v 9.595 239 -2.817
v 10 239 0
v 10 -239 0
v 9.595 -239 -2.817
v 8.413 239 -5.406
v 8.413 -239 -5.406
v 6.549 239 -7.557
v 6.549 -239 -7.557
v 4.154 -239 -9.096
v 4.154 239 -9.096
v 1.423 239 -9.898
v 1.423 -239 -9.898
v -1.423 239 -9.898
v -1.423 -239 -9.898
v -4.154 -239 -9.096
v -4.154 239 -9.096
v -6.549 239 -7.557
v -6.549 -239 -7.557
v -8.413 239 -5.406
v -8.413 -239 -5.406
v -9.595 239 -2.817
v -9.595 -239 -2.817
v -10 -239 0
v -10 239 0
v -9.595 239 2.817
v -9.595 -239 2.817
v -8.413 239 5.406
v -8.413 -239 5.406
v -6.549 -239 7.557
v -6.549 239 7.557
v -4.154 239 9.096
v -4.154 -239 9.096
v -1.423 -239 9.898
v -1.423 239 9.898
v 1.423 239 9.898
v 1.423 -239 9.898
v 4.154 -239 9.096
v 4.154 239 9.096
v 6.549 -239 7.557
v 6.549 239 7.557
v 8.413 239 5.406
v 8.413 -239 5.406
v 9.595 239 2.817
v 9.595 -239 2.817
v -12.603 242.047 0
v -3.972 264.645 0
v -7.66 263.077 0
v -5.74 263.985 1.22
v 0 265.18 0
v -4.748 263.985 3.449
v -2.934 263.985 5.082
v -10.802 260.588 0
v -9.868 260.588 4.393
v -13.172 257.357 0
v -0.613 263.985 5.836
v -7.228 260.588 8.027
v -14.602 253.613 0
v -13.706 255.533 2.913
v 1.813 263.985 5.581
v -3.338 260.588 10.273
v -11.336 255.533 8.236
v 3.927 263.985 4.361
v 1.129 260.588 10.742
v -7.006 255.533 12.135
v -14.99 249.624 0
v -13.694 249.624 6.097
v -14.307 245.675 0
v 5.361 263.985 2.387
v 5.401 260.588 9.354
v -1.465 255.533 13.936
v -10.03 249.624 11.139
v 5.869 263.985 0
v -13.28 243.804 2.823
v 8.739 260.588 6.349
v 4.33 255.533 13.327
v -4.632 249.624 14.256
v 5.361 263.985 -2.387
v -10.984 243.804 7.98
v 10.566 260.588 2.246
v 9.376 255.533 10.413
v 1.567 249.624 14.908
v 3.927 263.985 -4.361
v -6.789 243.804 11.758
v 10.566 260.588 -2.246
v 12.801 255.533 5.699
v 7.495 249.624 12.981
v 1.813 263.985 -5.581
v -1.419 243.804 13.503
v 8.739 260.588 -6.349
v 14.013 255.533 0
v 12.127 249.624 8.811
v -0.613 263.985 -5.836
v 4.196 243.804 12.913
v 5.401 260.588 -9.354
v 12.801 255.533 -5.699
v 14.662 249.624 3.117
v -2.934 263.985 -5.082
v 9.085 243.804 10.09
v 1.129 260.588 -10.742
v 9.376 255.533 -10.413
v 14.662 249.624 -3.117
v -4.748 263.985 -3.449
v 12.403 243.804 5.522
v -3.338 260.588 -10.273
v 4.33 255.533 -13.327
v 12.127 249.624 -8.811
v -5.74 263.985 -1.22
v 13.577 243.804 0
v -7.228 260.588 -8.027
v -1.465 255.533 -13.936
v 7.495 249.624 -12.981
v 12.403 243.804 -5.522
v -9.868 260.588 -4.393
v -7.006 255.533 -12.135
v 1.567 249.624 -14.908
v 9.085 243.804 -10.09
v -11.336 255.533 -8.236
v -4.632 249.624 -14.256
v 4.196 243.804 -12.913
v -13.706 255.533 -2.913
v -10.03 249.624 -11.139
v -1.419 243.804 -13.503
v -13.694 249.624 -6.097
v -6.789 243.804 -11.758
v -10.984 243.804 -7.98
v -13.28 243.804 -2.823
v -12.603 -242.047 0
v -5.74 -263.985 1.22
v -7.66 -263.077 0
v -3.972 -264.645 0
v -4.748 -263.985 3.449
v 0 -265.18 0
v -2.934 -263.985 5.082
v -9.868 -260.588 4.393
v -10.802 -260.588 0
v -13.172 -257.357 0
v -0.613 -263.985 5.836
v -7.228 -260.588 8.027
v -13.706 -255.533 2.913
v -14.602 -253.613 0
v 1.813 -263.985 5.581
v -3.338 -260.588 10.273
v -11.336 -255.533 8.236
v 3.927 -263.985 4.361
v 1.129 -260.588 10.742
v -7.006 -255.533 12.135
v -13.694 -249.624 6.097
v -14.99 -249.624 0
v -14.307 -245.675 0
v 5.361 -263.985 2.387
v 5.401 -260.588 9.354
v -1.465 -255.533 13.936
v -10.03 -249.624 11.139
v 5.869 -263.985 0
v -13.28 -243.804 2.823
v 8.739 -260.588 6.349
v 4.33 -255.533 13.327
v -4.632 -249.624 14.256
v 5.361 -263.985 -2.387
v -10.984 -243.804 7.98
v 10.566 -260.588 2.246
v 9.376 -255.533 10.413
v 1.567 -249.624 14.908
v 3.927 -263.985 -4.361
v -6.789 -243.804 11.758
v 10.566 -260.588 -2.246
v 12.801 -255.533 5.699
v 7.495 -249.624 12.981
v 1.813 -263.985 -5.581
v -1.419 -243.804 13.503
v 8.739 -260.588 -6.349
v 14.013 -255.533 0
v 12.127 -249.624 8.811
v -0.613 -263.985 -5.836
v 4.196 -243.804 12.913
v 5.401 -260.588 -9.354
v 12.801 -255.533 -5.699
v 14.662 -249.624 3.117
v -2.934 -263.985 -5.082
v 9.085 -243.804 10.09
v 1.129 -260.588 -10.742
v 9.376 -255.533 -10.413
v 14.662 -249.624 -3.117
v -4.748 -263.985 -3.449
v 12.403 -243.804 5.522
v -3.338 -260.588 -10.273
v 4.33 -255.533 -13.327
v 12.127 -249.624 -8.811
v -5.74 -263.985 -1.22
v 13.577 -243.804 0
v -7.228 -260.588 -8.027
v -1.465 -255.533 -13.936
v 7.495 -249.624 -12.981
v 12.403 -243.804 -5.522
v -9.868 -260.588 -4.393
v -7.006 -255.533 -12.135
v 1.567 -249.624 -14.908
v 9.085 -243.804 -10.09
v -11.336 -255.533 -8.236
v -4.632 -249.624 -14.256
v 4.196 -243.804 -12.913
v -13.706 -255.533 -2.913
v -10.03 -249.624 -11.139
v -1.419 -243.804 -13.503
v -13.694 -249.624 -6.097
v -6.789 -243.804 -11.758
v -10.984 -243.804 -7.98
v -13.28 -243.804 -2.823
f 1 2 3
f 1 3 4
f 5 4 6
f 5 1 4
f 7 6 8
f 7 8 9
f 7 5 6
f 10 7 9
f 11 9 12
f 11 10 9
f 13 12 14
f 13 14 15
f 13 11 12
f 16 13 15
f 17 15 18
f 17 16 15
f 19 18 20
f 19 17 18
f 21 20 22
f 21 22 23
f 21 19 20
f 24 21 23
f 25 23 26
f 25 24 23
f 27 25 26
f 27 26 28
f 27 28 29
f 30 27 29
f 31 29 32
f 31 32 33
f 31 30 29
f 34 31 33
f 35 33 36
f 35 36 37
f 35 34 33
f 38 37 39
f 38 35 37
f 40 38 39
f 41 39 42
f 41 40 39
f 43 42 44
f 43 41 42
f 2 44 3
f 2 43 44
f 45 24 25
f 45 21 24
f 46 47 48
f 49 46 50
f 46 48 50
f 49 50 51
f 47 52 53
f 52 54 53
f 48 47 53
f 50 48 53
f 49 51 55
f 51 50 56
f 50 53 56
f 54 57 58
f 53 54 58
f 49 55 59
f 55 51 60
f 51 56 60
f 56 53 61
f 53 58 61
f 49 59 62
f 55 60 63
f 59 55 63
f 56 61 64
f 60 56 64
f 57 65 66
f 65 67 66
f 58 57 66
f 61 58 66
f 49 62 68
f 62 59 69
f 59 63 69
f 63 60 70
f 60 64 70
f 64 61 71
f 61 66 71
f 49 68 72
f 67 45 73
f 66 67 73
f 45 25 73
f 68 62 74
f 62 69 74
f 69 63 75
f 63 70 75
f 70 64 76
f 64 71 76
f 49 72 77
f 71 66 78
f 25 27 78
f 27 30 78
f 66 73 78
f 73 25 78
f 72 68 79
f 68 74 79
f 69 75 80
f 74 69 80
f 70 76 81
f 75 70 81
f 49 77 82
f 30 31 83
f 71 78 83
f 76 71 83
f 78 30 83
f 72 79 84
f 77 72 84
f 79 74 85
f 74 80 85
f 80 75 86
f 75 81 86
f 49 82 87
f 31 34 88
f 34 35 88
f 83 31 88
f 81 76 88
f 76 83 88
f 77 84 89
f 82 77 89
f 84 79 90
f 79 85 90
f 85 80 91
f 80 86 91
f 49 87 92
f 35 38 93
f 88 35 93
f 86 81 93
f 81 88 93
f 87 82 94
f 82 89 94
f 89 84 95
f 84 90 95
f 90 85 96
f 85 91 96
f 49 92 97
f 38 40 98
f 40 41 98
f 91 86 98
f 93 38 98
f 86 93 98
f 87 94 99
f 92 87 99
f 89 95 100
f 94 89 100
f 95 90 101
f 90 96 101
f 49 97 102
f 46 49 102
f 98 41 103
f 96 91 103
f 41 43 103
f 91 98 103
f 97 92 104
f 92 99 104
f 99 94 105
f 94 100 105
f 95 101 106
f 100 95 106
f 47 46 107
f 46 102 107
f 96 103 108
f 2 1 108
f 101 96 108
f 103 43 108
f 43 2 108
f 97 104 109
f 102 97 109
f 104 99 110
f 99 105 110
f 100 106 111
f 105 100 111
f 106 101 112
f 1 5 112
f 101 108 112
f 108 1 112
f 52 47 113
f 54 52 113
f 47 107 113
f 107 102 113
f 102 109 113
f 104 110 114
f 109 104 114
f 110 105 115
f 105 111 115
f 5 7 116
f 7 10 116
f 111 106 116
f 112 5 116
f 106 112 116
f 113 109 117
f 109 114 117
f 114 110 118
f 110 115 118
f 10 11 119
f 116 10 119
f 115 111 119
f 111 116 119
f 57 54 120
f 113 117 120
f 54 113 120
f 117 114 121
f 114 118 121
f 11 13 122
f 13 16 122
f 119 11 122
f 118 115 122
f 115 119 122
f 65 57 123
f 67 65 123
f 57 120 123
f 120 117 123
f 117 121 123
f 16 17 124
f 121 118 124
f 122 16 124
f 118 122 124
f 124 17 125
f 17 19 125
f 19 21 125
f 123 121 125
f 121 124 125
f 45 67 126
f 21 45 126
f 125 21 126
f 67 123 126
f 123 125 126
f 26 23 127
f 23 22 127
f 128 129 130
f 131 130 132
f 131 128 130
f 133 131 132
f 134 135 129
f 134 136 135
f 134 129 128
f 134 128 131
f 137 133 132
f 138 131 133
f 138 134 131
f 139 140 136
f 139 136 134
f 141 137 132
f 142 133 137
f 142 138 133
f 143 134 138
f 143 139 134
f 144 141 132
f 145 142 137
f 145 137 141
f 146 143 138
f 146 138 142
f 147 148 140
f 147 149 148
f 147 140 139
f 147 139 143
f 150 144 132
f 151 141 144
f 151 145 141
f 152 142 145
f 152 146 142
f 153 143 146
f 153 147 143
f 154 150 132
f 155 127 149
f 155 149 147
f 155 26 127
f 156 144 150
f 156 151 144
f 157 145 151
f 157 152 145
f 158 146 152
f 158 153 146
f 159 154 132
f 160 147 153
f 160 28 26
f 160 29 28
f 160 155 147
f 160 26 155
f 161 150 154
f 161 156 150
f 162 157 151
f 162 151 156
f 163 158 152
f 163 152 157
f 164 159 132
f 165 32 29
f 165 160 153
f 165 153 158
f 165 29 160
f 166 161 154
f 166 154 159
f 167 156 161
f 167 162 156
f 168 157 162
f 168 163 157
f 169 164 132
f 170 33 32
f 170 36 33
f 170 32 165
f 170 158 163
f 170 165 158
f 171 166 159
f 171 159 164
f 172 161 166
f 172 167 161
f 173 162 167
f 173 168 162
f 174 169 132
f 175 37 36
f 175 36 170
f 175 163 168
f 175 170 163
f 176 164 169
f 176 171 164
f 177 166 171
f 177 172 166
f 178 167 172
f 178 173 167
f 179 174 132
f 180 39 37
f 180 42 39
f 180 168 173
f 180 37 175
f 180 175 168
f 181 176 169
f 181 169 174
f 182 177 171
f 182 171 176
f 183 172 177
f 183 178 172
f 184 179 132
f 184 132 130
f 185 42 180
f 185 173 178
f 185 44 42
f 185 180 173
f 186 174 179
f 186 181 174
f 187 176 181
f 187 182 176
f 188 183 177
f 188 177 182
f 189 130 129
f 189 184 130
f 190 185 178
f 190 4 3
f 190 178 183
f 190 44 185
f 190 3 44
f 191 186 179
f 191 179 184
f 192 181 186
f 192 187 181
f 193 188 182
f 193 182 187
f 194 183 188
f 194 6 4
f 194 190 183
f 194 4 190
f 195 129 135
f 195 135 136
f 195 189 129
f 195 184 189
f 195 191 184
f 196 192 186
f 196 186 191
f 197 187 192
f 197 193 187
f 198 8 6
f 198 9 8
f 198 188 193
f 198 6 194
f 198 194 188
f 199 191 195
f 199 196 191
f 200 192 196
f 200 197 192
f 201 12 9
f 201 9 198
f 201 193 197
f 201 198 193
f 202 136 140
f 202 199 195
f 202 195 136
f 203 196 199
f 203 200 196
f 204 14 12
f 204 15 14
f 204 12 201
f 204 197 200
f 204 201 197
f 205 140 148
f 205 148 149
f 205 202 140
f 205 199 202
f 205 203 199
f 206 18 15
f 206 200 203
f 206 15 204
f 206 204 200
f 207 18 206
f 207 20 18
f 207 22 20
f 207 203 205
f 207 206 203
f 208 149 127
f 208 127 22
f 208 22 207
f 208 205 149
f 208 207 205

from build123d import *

# Parameters (mm, degrees)
SKETCH1_W = 10
SKETCH1_H = 478


with BuildPart() as part:
    # Sketch1 → Revolve1 (revolve)
    with BuildSketch(Plane.XY, mode=Mode.PRIVATE) as revolve1_sk:
        with Locations((-5, 0)):
            Rectangle(SKETCH1_W, SKETCH1_H)
    revolve(revolve1_sk.sketch.rotate(Axis((0, -239, 0), (0, 1, 0)), 180), axis=Axis((0, -239, 0), (0, 1, 0)))

    # Sketch2 → Revolve2 (revolve)
    with BuildSketch(Plane.XY):
        with BuildLine():
            Line((-10, 239), (0, 239))
            Line((0, 239), (0, 265.180339887))
            ThreePointArc((0, 265.180339887), (-14.012585384, 255.532671234), (-10, 239))
        make_face()
    revolve2 = revolve(axis=Axis((0, 0, 0), (0, 1, 0)))

    # Mirror1: Revolve2 across plane
    add(revolve2.mirror(Plane.ZX))


solid = part.part
